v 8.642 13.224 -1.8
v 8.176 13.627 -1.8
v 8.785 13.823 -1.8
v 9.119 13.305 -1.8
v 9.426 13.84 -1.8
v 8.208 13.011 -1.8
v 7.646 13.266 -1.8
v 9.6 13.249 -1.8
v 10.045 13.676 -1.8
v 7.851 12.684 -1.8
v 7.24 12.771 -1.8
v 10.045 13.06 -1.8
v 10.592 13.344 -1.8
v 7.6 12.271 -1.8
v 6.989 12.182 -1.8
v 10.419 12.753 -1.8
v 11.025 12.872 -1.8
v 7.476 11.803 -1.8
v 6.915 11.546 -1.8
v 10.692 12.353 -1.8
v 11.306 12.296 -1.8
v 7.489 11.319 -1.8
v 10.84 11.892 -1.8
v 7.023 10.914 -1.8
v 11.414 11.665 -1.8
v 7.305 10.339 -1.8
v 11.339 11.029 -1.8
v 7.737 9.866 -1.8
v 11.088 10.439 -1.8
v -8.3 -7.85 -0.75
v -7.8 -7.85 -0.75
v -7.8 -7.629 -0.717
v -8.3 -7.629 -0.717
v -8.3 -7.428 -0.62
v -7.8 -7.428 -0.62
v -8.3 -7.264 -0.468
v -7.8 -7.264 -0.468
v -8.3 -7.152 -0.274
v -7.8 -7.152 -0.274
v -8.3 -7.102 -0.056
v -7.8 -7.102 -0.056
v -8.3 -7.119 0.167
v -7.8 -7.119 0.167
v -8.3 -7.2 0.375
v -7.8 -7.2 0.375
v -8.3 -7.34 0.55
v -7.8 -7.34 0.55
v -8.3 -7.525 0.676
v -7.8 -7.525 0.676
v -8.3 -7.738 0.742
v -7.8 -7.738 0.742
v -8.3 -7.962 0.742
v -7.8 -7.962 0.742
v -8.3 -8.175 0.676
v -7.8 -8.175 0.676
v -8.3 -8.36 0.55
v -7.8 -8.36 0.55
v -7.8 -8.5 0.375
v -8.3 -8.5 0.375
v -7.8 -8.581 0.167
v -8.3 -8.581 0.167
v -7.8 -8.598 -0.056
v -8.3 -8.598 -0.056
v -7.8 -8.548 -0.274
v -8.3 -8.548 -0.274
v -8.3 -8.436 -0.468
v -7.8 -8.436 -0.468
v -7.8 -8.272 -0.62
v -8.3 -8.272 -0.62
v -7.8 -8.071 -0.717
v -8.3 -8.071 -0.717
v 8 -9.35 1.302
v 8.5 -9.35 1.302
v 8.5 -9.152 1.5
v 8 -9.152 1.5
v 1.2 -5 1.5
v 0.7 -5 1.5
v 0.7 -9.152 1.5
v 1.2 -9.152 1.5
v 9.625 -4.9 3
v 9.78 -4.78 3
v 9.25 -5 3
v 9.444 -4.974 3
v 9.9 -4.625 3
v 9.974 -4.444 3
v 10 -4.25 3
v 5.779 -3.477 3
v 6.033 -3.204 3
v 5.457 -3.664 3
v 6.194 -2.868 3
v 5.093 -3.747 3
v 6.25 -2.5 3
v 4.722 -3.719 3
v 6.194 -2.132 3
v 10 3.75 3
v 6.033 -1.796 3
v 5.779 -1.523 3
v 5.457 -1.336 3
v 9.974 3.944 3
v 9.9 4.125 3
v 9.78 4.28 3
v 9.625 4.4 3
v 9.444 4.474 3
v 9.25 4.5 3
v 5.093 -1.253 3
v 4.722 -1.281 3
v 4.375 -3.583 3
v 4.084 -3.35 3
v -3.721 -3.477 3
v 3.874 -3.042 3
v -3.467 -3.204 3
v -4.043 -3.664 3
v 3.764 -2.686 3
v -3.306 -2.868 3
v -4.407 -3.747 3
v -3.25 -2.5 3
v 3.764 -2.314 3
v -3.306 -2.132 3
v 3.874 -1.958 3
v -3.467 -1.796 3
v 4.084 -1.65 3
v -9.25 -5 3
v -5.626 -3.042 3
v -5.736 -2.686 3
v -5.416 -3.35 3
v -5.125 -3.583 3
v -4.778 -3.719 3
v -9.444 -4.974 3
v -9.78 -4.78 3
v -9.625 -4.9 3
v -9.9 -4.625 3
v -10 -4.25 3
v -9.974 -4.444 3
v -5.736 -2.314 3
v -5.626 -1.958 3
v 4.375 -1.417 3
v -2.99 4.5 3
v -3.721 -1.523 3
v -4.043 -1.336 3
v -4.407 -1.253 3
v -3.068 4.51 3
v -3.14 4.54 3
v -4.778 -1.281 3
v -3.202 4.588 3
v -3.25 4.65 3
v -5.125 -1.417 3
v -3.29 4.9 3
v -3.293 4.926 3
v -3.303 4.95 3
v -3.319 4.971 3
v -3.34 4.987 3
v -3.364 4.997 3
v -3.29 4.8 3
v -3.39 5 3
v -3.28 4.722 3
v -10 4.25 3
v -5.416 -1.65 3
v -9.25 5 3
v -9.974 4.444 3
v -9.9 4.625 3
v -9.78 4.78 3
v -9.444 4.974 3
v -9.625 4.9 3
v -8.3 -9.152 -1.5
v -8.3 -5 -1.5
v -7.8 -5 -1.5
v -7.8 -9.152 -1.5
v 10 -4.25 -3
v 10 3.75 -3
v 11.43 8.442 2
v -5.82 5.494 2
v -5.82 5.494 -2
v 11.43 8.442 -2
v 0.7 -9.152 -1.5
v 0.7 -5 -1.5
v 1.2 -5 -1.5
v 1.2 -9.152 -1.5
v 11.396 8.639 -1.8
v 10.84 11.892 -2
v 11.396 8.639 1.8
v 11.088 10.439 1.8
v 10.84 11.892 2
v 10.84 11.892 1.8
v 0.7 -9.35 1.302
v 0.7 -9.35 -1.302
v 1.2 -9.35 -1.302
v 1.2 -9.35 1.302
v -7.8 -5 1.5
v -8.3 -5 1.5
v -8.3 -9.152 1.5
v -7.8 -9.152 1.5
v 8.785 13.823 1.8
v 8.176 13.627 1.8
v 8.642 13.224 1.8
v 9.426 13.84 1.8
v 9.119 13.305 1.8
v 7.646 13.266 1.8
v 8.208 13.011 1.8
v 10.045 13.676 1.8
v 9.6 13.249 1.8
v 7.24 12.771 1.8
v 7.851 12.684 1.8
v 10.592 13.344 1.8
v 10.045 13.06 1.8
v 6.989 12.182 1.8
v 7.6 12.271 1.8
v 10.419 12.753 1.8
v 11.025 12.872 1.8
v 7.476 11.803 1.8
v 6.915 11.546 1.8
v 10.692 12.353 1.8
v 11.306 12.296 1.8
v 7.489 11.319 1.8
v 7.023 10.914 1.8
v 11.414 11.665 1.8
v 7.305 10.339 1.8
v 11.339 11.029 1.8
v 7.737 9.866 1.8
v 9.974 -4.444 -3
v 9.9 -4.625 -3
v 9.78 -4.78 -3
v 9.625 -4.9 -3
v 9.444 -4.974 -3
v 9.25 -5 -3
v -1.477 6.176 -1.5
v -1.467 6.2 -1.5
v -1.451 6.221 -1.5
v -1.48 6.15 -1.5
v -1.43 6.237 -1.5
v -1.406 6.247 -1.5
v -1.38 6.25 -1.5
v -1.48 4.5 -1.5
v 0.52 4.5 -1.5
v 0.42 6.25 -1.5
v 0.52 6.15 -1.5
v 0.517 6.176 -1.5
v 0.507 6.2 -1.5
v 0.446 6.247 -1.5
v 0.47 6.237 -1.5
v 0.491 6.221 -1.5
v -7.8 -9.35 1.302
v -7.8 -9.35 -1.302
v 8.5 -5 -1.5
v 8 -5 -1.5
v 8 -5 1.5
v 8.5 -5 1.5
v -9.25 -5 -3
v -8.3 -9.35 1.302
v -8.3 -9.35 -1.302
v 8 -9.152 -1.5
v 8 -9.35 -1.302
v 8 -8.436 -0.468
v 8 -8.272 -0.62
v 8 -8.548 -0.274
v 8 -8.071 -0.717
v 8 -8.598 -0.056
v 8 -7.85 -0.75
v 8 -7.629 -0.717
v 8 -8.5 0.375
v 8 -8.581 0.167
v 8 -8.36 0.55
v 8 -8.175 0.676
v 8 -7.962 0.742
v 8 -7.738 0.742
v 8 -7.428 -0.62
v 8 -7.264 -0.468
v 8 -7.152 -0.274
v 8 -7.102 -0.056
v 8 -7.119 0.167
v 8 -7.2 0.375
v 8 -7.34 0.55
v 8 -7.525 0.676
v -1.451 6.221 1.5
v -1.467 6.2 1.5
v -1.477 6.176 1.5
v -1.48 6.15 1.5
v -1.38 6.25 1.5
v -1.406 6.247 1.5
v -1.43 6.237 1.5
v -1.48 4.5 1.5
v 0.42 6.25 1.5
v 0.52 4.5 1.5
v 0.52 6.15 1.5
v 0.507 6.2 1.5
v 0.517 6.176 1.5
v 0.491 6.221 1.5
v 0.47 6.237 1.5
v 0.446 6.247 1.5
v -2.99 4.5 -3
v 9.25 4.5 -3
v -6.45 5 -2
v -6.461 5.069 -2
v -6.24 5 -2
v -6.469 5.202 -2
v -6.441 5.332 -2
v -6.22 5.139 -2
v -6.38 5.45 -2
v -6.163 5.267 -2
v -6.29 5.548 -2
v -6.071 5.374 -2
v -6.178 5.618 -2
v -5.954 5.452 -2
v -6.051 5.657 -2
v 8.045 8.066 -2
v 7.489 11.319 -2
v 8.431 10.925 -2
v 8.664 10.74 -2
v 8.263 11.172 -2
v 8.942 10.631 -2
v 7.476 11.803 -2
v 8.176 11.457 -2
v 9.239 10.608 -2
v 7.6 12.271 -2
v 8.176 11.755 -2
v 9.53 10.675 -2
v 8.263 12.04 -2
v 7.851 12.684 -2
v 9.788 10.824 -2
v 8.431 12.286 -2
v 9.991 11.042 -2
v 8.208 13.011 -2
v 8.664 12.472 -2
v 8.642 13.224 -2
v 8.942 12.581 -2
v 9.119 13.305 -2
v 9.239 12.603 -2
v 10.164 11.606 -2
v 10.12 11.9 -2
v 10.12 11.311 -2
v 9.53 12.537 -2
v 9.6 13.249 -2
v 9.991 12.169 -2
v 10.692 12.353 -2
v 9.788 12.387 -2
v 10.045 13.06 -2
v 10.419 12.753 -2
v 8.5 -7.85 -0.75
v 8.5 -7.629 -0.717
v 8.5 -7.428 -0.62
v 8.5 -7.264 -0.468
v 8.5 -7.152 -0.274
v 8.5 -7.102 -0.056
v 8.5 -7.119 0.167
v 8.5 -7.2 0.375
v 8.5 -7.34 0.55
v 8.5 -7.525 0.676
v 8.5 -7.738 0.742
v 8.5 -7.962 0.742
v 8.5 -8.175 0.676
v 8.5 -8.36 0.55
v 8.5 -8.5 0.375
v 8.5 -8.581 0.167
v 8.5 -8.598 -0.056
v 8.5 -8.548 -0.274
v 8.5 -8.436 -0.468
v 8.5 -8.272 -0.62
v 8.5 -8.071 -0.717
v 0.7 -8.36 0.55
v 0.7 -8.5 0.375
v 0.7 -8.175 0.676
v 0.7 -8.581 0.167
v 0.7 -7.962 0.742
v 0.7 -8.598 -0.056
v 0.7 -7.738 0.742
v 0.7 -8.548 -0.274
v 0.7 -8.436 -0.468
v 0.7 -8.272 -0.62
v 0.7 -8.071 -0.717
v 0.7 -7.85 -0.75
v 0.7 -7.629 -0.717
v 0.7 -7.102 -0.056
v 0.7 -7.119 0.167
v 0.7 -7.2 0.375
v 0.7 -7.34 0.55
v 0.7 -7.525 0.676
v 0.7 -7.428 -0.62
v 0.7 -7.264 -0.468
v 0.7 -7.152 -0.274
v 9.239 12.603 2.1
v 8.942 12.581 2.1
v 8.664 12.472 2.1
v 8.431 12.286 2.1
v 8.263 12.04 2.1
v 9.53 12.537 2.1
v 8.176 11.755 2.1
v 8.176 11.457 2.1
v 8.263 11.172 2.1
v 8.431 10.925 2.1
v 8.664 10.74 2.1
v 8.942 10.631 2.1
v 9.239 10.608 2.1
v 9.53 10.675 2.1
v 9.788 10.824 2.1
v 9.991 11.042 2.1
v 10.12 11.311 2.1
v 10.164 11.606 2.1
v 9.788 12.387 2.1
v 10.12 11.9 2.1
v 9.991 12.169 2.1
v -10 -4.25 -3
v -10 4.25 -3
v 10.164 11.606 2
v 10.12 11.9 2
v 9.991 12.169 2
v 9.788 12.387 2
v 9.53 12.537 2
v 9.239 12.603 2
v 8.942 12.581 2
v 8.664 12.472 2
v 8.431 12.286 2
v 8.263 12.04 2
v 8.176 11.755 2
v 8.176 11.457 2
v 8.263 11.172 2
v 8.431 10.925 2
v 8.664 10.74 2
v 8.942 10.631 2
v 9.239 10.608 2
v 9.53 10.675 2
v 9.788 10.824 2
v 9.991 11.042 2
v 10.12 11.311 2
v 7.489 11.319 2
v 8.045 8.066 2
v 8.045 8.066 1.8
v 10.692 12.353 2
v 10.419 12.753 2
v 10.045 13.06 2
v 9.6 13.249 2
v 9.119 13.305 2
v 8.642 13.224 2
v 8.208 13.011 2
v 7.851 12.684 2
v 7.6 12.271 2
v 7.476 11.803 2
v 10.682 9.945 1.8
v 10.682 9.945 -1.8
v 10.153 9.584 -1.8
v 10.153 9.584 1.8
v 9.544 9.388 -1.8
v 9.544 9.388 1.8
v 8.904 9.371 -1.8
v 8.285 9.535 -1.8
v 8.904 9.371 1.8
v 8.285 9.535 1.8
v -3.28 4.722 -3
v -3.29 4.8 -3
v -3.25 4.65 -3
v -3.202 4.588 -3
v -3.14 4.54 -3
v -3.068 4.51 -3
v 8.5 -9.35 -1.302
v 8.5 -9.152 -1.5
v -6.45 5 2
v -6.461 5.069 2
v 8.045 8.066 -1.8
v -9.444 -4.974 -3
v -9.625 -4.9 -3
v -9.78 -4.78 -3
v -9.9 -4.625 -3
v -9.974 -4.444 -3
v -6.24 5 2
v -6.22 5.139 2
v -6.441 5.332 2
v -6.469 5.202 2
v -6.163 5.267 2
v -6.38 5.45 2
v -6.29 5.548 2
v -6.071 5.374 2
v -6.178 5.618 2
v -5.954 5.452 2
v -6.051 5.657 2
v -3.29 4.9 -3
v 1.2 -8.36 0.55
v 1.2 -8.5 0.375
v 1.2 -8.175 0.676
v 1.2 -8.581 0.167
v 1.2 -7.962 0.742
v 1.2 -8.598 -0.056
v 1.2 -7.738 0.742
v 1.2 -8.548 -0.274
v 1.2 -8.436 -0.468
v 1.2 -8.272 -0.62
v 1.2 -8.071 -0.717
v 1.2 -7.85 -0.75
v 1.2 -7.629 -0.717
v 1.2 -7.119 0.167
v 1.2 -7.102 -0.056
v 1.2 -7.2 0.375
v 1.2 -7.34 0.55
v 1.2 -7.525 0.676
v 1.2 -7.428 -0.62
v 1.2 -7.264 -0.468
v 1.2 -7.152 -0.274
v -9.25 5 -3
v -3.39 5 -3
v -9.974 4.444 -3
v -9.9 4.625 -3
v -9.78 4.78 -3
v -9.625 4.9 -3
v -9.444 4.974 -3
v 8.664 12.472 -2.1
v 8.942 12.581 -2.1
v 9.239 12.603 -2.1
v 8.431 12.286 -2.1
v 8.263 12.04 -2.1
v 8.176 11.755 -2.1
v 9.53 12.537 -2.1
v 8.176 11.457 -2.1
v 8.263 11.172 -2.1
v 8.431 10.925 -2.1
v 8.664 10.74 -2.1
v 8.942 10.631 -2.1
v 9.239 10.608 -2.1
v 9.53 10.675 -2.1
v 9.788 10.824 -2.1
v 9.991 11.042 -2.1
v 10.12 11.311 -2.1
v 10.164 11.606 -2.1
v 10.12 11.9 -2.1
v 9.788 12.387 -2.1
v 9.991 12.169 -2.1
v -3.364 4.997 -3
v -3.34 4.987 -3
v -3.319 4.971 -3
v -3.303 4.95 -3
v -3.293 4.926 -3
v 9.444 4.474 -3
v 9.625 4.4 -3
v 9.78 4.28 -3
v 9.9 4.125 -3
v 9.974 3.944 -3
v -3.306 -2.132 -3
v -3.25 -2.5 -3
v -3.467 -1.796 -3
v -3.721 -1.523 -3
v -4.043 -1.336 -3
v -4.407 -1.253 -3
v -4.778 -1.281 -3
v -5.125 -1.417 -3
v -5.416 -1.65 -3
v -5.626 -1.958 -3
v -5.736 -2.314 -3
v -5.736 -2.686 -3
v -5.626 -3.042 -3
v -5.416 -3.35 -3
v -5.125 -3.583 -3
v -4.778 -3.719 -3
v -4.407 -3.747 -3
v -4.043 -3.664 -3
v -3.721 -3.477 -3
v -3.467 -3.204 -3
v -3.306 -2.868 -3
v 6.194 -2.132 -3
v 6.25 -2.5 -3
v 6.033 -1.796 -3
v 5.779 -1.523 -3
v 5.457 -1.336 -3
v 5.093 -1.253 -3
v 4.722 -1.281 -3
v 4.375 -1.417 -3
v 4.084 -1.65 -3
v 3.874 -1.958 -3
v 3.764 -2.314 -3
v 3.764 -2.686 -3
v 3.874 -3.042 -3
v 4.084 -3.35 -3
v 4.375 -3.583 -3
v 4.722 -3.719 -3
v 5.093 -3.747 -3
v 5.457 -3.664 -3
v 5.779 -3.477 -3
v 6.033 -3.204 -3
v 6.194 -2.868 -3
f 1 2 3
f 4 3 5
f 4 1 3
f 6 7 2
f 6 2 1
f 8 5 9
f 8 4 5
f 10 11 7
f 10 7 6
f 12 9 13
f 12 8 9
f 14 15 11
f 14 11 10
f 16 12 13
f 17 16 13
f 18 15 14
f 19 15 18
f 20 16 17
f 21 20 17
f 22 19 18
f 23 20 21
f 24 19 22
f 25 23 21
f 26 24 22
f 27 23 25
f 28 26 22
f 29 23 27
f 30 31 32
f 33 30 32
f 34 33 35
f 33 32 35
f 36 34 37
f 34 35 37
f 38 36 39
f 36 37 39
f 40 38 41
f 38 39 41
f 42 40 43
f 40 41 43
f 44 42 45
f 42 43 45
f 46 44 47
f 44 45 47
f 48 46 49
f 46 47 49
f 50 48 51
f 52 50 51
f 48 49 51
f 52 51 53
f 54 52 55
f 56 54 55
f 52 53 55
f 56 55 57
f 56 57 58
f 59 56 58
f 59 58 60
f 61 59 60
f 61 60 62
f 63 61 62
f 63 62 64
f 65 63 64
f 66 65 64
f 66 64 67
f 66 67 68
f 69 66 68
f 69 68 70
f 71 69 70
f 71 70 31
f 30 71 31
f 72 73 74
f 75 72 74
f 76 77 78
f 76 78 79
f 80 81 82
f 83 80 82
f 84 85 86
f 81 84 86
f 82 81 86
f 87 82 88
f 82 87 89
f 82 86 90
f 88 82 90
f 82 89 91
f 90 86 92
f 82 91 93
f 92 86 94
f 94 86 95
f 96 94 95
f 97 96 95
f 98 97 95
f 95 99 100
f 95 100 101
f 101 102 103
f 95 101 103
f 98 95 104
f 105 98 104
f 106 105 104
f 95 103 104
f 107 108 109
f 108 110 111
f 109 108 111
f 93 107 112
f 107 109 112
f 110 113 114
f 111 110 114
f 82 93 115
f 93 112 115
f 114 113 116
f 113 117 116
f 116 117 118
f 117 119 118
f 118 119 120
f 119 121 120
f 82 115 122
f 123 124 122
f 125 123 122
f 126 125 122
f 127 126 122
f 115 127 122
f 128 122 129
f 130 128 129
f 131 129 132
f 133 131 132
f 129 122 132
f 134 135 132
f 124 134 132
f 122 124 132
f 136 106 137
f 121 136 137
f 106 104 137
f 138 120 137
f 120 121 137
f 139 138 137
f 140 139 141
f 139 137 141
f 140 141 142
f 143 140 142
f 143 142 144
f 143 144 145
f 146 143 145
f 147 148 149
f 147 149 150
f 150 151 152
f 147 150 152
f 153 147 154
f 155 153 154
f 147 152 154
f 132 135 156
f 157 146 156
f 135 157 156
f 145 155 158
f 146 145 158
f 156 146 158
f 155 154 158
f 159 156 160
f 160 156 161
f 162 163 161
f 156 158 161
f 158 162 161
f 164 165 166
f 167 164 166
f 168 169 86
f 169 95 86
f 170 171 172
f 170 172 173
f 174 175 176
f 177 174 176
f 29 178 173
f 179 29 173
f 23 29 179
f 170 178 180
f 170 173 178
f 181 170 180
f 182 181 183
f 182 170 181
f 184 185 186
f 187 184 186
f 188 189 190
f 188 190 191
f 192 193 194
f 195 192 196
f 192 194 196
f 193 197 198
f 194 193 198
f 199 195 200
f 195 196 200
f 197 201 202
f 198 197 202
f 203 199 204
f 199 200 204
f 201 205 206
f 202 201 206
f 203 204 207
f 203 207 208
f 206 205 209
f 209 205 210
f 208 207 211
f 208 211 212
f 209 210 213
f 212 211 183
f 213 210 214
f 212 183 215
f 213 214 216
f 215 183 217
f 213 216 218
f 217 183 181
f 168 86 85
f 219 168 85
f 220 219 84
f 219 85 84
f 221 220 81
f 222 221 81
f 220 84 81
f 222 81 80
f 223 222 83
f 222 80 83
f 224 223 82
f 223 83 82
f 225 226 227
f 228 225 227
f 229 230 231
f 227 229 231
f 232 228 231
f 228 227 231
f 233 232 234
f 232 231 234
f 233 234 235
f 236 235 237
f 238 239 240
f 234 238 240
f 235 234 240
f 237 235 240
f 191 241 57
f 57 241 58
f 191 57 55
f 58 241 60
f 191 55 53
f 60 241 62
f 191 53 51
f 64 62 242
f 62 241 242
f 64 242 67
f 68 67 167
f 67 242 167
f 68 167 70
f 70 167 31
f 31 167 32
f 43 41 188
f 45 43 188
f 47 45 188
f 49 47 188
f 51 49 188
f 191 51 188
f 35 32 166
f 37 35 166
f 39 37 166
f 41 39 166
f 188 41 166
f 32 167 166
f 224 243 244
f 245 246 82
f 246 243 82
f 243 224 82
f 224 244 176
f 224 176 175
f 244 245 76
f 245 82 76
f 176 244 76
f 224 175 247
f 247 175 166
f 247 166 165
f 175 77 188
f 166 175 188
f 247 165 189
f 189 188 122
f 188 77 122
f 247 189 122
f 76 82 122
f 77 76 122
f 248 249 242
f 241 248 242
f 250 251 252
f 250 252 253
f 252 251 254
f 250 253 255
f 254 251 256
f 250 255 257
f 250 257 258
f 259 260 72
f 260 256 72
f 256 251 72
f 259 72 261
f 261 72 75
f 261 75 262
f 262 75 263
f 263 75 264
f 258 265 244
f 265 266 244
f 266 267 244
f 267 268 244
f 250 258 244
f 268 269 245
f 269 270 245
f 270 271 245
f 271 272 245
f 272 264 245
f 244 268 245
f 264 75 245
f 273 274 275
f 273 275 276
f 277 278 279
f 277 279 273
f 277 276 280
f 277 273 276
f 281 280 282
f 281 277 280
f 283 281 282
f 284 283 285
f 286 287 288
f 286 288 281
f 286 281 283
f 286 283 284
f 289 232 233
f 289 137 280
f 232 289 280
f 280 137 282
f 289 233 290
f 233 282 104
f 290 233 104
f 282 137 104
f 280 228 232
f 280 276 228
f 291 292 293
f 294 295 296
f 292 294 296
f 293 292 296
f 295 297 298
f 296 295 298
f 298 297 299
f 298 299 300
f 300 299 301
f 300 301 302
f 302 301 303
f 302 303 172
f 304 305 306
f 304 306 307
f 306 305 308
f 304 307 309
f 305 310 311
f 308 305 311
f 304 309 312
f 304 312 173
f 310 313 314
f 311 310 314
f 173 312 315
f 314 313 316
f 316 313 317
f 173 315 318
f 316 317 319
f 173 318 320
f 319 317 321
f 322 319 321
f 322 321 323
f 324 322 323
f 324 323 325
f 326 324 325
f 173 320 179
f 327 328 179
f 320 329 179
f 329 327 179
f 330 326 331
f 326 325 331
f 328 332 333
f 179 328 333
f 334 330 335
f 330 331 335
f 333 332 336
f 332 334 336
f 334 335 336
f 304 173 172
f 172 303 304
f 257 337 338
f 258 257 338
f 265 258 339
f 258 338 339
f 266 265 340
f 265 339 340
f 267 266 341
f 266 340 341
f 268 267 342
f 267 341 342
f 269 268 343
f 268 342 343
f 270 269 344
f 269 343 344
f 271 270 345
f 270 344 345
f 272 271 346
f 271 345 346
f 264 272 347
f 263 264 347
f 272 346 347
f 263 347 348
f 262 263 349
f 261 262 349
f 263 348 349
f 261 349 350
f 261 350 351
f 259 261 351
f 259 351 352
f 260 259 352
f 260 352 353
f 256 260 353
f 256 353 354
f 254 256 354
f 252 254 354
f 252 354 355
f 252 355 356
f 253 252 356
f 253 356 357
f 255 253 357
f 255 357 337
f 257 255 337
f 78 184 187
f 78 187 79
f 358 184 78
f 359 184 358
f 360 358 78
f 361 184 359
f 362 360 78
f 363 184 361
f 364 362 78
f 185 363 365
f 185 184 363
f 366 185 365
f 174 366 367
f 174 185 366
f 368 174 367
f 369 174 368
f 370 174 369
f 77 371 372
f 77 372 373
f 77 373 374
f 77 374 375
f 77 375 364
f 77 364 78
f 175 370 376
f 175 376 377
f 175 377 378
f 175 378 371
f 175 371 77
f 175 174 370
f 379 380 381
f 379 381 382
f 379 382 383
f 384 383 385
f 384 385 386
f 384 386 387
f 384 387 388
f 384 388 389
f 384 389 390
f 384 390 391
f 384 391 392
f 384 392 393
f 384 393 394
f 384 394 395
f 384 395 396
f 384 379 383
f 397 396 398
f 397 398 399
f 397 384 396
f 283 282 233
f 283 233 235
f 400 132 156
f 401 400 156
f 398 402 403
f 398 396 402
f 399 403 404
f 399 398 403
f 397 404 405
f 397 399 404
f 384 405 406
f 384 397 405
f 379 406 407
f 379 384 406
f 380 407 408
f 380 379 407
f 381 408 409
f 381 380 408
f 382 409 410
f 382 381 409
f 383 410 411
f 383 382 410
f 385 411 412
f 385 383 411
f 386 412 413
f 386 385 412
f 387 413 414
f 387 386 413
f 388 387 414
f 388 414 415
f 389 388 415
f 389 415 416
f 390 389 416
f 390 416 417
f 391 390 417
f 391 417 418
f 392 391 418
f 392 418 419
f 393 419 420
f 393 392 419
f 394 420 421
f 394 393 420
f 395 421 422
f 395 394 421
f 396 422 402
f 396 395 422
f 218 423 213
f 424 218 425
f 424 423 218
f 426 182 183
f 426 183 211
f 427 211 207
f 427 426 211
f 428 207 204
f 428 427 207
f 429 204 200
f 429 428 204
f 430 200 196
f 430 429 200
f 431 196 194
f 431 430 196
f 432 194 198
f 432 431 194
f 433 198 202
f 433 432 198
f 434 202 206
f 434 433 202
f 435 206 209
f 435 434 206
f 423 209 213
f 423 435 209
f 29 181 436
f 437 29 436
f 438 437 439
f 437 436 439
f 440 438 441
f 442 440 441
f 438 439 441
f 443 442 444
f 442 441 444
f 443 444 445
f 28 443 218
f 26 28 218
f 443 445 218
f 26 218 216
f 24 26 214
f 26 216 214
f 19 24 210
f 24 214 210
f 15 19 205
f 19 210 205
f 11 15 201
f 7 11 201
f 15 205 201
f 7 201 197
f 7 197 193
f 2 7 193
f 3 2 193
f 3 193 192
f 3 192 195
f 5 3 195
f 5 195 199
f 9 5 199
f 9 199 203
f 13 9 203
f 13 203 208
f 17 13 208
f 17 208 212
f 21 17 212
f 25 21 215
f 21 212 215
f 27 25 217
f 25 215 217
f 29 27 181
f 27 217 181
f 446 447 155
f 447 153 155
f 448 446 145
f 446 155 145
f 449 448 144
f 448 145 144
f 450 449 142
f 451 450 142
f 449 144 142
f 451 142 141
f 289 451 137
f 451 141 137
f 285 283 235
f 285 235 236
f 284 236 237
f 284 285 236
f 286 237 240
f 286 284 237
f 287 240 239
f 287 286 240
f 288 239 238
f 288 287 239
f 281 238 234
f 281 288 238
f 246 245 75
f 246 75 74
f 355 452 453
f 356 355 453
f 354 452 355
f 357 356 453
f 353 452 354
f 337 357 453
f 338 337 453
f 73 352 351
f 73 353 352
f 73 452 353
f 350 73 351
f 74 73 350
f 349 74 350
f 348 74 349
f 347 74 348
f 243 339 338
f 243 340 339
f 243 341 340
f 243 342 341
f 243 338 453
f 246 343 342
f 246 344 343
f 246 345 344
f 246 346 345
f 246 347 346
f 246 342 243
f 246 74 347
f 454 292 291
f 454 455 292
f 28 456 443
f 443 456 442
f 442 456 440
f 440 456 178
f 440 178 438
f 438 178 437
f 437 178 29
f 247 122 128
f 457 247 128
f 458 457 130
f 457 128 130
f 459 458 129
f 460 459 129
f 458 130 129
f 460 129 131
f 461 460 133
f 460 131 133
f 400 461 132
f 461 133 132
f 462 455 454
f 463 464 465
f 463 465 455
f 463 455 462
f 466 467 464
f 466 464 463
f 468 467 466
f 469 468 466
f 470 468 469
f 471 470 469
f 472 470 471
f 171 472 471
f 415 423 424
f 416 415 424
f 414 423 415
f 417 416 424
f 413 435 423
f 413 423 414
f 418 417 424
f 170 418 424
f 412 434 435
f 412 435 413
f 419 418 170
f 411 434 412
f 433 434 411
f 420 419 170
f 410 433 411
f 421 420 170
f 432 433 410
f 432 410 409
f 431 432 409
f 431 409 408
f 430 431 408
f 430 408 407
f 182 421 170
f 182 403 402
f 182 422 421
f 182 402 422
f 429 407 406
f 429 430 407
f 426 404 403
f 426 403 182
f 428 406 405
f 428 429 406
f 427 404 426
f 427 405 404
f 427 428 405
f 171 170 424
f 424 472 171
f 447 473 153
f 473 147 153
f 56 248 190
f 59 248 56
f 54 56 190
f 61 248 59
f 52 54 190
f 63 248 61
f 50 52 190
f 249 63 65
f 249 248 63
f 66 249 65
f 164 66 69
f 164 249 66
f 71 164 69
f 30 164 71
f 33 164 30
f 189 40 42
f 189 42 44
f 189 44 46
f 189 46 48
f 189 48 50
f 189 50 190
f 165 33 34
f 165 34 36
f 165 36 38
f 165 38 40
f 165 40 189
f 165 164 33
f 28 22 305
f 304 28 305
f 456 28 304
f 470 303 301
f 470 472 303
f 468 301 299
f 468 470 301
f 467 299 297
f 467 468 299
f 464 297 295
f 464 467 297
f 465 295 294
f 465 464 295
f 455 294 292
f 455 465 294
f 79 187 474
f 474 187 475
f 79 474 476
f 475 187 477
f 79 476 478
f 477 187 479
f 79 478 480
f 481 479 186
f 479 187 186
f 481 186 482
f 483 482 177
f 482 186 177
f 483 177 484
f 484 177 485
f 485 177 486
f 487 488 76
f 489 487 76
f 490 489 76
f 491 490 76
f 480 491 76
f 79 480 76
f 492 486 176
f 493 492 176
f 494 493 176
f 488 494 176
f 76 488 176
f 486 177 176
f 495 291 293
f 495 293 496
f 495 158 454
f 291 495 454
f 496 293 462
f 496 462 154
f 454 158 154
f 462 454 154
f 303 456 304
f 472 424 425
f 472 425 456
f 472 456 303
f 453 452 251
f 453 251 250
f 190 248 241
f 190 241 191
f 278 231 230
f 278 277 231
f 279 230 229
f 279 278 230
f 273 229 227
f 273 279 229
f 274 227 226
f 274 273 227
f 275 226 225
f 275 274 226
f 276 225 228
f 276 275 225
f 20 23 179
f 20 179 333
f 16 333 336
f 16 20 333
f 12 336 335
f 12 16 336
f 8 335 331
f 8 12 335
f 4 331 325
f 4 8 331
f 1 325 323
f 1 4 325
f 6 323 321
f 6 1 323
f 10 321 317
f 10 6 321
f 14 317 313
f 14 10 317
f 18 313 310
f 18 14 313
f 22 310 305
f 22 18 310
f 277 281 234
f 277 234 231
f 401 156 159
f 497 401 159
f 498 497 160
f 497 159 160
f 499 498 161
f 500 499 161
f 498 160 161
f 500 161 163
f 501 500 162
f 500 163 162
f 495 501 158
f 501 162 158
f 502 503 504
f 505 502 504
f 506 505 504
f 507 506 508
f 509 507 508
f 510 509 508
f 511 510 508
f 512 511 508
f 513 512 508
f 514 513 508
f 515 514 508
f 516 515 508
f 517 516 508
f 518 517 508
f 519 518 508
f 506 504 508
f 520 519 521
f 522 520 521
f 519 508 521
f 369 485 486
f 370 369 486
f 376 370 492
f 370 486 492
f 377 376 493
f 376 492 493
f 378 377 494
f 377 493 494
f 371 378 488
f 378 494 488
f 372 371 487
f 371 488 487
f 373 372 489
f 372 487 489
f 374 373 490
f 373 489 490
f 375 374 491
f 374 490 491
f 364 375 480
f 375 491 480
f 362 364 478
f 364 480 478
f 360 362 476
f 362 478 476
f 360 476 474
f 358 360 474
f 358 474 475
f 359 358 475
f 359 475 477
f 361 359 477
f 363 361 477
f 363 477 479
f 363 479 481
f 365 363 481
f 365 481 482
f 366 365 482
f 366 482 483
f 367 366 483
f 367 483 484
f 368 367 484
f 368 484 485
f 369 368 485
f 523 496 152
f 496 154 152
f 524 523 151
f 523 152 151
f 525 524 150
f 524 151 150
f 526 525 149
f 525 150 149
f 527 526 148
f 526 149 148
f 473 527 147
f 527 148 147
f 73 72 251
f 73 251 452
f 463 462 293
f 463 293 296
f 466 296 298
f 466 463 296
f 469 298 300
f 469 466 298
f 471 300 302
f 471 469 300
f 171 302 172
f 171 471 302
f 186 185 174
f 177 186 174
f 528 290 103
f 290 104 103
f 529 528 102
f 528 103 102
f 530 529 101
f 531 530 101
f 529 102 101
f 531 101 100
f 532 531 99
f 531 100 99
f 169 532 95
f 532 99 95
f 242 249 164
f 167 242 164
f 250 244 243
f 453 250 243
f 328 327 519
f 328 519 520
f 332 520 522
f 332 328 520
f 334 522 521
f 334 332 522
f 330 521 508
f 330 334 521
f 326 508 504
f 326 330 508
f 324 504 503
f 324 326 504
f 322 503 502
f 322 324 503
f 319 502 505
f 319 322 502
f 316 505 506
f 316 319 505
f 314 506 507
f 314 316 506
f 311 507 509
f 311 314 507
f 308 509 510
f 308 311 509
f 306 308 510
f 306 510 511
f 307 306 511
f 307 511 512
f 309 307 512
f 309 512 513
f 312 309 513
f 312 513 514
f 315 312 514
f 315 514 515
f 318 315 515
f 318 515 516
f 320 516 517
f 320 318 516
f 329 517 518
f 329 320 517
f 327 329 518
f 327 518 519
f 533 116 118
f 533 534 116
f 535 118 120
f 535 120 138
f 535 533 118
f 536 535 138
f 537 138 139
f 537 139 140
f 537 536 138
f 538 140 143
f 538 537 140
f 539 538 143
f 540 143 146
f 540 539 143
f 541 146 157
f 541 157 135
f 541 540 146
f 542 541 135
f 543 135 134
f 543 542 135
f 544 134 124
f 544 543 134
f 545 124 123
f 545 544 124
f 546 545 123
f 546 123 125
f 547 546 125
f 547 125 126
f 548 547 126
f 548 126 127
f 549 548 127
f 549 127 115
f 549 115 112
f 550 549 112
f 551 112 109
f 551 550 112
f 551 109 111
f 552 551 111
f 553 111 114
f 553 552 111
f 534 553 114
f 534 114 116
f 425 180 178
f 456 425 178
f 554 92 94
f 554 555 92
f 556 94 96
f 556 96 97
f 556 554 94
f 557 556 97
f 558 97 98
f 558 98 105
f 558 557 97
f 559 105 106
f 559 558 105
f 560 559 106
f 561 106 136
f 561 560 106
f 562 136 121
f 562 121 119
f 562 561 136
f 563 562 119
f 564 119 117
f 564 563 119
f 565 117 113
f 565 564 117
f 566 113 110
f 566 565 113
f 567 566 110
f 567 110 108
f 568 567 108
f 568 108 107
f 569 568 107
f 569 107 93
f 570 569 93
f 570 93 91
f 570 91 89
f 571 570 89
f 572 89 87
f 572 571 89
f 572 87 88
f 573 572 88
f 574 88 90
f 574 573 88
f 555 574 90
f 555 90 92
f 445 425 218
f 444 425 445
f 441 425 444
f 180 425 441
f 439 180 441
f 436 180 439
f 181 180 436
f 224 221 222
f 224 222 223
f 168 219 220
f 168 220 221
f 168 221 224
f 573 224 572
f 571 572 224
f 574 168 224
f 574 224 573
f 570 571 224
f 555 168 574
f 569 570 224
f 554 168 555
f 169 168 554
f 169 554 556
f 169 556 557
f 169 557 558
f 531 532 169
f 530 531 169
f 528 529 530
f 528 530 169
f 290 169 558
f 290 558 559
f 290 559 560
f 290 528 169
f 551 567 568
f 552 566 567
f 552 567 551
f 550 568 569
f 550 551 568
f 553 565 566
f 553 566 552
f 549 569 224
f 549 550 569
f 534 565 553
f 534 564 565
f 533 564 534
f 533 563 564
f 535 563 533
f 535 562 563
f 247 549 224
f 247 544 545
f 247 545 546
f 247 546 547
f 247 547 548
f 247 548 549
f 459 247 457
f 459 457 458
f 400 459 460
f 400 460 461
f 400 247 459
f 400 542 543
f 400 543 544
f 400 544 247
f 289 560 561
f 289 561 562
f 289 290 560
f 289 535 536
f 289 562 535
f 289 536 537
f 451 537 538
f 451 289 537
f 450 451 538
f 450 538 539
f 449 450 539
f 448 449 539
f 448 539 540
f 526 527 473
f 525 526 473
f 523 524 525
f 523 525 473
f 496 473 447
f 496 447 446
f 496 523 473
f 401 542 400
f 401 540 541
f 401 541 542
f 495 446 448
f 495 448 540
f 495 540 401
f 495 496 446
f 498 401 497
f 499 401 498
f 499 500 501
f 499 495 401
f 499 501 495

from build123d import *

# Parameters (mm, degrees)
CROQUIS1_R              = 1.25
SALIENTE_EXTRUIR3_DEPTH = 3
CROQUIS7_W              = 0.5
CROQUIS7_H              = 4.35
SALIENTE_EXTRUIR4_DEPTH = 1.5
CROQUIS8_R              = 0.75
CORTAR_EXTRUIR1_DEPTH   = 21.944510021
SALIENTE_EXTRUIR5_DEPTH = 1.5
CROQUIS10_R             = 0.5
SALIENTE_EXTRUIR6_DEPTH = 2
CORTAR_EXTRUIR2_REACH   = 27.447
CROQUIS11_W             = 3.6
CROQUIS11_H             = 5.5
CROQUIS12_R             = 2.25
SALIENTE_EXTRUIR8_DEPTH = 3.6
CROQUIS13_R             = 1
SALIENTE_EXTRUIR9_DEPTH = 2.1


with BuildPart() as part:
    # Croquis1 → Saliente-Extruir3 (new, symmetric)
    with BuildSketch(Plane.XY):
        with BuildLine():
            Line((-9.25, 5), (-3.39, 5))
            ThreePointArc((-3.39, 5), (-3.319289322, 4.970710678), (-3.29, 4.9))
            Line((-3.29, 4.9), (-3.29, 4.8))
            ThreePointArc((-3.29, 4.8), (-3.202132034, 4.587867966), (-2.99, 4.5))
            Line((-2.99, 4.5), (9.25, 4.5))
            ThreePointArc((9.25, 4.5), (9.780330086, 4.280330086), (10, 3.75))
            Line((10, 3.75), (10, -4.25))
            ThreePointArc((10, -4.25), (9.780330086, -4.780330086), (9.25, -5))
            Line((9.25, -5), (-9.25, -5))
            ThreePointArc((-9.25, -5), (-9.780330086, -4.780330086), (-10, -4.25))
            Line((-10, -4.25), (-10, 4.25))
            ThreePointArc((-10, 4.25), (-9.780330086, 4.780330086), (-9.25, 5))
        make_face()
        with Locations((-4.5, -2.5)):
            Circle(CROQUIS1_R, mode=Mode.SUBTRACT)
        with Locations((5, -2.5)):
            Circle(CROQUIS1_R, mode=Mode.SUBTRACT)
    extrude(amount=SALIENTE_EXTRUIR3_DEPTH, both=True)

    # Croquis7 → Saliente-Extruir4 (add, symmetric)
    with BuildSketch(Plane.XY):
        with Locations((-8.05, -7.175)):
            Rectangle(CROQUIS7_W, CROQUIS7_H)
        with Locations((0.95, -7.175)):
            Rectangle(CROQUIS7_W, CROQUIS7_H)
        with Locations((8.25, -7.175)):
            Rectangle(CROQUIS7_W, CROQUIS7_H)
    extrude(amount=SALIENTE_EXTRUIR4_DEPTH, both=True)

    # Croquis8 → Cortar-Extruir1 (cut, through all)
    with BuildSketch(Plane(origin=(8.5, 0, 0), x_dir=(0, 0, -1), z_dir=(1, 0, 0))):
        with Locations((0, -7.85)):
            Circle(CROQUIS8_R)
        Polygon((-1.5, -9.152010101), (-1.5, -9.35), (-1.302010101, -9.35), align=None)
        Polygon((1.302010101, -9.35), (1.5, -9.152010101), (1.5, -9.35), align=None)
    extrude(amount=-CORTAR_EXTRUIR1_DEPTH, mode=Mode.SUBTRACT)

    # Croquis9 → Saliente-Extruir5 (add, symmetric)
    with BuildSketch(Plane.XY):
        with BuildLine():
            Line((-1.48, 4.5), (0.52, 4.5))
            Line((0.52, 4.5), (0.52, 6.15))
            ThreePointArc((0.52, 6.15), (0.490710678, 6.220710678), (0.42, 6.25))
            Line((0.42, 6.25), (-1.38, 6.25))
            ThreePointArc((-1.38, 6.25), (-1.450710678, 6.220710678), (-1.48, 6.15))
            Line((-1.48, 6.15), (-1.48, 4.5))
        make_face()
    extrude(amount=SALIENTE_EXTRUIR5_DEPTH, both=True)

    # Croquis10 → Saliente-Extruir6 (add, symmetric)
    with BuildSketch(Plane.XY):
        with BuildLine():
            Line((-6.45, 5), (-6.24, 5))
            ThreePointArc((-6.24, 5), (-6.120788655, 5.324037035), (-5.82, 5.493558507))
            Line((-5.82, 5.493558507), (11.429810709, 8.44212265))
            Line((11.429810709, 8.44212265), (10.840097881, 11.892084791))
            ThreePointArc((10.840097881, 11.892084791), (8.877970038, 13.281348744), (7.488706086, 11.319220901))
            Line((7.488706086, 11.319220901), (8.044721038, 8.066399453))
            Line((8.044721038, 8.066399453), (-6.05083857, 5.657001325))
            ThreePointArc((-6.05083857, 5.657001325), (-6.380057775, 5.449678442), (-6.460998376, 5.06913057))
            Line((-6.460998376, 5.06913057), (-6.45, 5))
        make_face()
        with Locations((9.164401983, 11.605652846)):
            Circle(CROQUIS10_R, mode=Mode.SUBTRACT)
    extrude(amount=SALIENTE_EXTRUIR6_DEPTH, both=True)

    # Croquis11 → Cortar-Extruir2 (cut, up to next)
    with BuildSketch(Plane(origin=(12.50740608, 2.137930074, 0), x_dir=(0, 0, -1), z_dir=(0.9857034690888546, 0.16848937956499643, 0)), mode=Mode.PRIVATE) as cortar_extruir2_sk1:
        with Locations((0, 9.345627867)):
            Rectangle(CROQUIS11_W, CROQUIS11_H)
    cortar_extruir2_tool1 = extrude(cortar_extruir2_sk1.sketch, amount=-CORTAR_EXTRUIR2_REACH, mode=Mode.PRIVATE) & part.part
    add(cortar_extruir2_tool1.solids().sort_by_distance((10.932767, 11.349948, 0))[0], mode=Mode.SUBTRACT)

    # Croquis12 → Saliente-Extruir8 (add)
    with BuildSketch(Plane(origin=(0, 0, 1.8), x_dir=(-1, 0, 0), z_dir=(0, 0, -1))):
        with Locations(Location((-9.164401983, 11.605652846, 0), (0, 0, 211.22606331))):
            Circle(CROQUIS12_R)
    extrude(amount=SALIENTE_EXTRUIR8_DEPTH)

    # Croquis13 → Saliente-Extruir9 (add, symmetric)
    with BuildSketch(Plane.XY):
        with Locations((9.164401983, 11.605652846)):
            Circle(CROQUIS13_R)
    extrude(amount=SALIENTE_EXTRUIR9_DEPTH, both=True)


solid = part.part
